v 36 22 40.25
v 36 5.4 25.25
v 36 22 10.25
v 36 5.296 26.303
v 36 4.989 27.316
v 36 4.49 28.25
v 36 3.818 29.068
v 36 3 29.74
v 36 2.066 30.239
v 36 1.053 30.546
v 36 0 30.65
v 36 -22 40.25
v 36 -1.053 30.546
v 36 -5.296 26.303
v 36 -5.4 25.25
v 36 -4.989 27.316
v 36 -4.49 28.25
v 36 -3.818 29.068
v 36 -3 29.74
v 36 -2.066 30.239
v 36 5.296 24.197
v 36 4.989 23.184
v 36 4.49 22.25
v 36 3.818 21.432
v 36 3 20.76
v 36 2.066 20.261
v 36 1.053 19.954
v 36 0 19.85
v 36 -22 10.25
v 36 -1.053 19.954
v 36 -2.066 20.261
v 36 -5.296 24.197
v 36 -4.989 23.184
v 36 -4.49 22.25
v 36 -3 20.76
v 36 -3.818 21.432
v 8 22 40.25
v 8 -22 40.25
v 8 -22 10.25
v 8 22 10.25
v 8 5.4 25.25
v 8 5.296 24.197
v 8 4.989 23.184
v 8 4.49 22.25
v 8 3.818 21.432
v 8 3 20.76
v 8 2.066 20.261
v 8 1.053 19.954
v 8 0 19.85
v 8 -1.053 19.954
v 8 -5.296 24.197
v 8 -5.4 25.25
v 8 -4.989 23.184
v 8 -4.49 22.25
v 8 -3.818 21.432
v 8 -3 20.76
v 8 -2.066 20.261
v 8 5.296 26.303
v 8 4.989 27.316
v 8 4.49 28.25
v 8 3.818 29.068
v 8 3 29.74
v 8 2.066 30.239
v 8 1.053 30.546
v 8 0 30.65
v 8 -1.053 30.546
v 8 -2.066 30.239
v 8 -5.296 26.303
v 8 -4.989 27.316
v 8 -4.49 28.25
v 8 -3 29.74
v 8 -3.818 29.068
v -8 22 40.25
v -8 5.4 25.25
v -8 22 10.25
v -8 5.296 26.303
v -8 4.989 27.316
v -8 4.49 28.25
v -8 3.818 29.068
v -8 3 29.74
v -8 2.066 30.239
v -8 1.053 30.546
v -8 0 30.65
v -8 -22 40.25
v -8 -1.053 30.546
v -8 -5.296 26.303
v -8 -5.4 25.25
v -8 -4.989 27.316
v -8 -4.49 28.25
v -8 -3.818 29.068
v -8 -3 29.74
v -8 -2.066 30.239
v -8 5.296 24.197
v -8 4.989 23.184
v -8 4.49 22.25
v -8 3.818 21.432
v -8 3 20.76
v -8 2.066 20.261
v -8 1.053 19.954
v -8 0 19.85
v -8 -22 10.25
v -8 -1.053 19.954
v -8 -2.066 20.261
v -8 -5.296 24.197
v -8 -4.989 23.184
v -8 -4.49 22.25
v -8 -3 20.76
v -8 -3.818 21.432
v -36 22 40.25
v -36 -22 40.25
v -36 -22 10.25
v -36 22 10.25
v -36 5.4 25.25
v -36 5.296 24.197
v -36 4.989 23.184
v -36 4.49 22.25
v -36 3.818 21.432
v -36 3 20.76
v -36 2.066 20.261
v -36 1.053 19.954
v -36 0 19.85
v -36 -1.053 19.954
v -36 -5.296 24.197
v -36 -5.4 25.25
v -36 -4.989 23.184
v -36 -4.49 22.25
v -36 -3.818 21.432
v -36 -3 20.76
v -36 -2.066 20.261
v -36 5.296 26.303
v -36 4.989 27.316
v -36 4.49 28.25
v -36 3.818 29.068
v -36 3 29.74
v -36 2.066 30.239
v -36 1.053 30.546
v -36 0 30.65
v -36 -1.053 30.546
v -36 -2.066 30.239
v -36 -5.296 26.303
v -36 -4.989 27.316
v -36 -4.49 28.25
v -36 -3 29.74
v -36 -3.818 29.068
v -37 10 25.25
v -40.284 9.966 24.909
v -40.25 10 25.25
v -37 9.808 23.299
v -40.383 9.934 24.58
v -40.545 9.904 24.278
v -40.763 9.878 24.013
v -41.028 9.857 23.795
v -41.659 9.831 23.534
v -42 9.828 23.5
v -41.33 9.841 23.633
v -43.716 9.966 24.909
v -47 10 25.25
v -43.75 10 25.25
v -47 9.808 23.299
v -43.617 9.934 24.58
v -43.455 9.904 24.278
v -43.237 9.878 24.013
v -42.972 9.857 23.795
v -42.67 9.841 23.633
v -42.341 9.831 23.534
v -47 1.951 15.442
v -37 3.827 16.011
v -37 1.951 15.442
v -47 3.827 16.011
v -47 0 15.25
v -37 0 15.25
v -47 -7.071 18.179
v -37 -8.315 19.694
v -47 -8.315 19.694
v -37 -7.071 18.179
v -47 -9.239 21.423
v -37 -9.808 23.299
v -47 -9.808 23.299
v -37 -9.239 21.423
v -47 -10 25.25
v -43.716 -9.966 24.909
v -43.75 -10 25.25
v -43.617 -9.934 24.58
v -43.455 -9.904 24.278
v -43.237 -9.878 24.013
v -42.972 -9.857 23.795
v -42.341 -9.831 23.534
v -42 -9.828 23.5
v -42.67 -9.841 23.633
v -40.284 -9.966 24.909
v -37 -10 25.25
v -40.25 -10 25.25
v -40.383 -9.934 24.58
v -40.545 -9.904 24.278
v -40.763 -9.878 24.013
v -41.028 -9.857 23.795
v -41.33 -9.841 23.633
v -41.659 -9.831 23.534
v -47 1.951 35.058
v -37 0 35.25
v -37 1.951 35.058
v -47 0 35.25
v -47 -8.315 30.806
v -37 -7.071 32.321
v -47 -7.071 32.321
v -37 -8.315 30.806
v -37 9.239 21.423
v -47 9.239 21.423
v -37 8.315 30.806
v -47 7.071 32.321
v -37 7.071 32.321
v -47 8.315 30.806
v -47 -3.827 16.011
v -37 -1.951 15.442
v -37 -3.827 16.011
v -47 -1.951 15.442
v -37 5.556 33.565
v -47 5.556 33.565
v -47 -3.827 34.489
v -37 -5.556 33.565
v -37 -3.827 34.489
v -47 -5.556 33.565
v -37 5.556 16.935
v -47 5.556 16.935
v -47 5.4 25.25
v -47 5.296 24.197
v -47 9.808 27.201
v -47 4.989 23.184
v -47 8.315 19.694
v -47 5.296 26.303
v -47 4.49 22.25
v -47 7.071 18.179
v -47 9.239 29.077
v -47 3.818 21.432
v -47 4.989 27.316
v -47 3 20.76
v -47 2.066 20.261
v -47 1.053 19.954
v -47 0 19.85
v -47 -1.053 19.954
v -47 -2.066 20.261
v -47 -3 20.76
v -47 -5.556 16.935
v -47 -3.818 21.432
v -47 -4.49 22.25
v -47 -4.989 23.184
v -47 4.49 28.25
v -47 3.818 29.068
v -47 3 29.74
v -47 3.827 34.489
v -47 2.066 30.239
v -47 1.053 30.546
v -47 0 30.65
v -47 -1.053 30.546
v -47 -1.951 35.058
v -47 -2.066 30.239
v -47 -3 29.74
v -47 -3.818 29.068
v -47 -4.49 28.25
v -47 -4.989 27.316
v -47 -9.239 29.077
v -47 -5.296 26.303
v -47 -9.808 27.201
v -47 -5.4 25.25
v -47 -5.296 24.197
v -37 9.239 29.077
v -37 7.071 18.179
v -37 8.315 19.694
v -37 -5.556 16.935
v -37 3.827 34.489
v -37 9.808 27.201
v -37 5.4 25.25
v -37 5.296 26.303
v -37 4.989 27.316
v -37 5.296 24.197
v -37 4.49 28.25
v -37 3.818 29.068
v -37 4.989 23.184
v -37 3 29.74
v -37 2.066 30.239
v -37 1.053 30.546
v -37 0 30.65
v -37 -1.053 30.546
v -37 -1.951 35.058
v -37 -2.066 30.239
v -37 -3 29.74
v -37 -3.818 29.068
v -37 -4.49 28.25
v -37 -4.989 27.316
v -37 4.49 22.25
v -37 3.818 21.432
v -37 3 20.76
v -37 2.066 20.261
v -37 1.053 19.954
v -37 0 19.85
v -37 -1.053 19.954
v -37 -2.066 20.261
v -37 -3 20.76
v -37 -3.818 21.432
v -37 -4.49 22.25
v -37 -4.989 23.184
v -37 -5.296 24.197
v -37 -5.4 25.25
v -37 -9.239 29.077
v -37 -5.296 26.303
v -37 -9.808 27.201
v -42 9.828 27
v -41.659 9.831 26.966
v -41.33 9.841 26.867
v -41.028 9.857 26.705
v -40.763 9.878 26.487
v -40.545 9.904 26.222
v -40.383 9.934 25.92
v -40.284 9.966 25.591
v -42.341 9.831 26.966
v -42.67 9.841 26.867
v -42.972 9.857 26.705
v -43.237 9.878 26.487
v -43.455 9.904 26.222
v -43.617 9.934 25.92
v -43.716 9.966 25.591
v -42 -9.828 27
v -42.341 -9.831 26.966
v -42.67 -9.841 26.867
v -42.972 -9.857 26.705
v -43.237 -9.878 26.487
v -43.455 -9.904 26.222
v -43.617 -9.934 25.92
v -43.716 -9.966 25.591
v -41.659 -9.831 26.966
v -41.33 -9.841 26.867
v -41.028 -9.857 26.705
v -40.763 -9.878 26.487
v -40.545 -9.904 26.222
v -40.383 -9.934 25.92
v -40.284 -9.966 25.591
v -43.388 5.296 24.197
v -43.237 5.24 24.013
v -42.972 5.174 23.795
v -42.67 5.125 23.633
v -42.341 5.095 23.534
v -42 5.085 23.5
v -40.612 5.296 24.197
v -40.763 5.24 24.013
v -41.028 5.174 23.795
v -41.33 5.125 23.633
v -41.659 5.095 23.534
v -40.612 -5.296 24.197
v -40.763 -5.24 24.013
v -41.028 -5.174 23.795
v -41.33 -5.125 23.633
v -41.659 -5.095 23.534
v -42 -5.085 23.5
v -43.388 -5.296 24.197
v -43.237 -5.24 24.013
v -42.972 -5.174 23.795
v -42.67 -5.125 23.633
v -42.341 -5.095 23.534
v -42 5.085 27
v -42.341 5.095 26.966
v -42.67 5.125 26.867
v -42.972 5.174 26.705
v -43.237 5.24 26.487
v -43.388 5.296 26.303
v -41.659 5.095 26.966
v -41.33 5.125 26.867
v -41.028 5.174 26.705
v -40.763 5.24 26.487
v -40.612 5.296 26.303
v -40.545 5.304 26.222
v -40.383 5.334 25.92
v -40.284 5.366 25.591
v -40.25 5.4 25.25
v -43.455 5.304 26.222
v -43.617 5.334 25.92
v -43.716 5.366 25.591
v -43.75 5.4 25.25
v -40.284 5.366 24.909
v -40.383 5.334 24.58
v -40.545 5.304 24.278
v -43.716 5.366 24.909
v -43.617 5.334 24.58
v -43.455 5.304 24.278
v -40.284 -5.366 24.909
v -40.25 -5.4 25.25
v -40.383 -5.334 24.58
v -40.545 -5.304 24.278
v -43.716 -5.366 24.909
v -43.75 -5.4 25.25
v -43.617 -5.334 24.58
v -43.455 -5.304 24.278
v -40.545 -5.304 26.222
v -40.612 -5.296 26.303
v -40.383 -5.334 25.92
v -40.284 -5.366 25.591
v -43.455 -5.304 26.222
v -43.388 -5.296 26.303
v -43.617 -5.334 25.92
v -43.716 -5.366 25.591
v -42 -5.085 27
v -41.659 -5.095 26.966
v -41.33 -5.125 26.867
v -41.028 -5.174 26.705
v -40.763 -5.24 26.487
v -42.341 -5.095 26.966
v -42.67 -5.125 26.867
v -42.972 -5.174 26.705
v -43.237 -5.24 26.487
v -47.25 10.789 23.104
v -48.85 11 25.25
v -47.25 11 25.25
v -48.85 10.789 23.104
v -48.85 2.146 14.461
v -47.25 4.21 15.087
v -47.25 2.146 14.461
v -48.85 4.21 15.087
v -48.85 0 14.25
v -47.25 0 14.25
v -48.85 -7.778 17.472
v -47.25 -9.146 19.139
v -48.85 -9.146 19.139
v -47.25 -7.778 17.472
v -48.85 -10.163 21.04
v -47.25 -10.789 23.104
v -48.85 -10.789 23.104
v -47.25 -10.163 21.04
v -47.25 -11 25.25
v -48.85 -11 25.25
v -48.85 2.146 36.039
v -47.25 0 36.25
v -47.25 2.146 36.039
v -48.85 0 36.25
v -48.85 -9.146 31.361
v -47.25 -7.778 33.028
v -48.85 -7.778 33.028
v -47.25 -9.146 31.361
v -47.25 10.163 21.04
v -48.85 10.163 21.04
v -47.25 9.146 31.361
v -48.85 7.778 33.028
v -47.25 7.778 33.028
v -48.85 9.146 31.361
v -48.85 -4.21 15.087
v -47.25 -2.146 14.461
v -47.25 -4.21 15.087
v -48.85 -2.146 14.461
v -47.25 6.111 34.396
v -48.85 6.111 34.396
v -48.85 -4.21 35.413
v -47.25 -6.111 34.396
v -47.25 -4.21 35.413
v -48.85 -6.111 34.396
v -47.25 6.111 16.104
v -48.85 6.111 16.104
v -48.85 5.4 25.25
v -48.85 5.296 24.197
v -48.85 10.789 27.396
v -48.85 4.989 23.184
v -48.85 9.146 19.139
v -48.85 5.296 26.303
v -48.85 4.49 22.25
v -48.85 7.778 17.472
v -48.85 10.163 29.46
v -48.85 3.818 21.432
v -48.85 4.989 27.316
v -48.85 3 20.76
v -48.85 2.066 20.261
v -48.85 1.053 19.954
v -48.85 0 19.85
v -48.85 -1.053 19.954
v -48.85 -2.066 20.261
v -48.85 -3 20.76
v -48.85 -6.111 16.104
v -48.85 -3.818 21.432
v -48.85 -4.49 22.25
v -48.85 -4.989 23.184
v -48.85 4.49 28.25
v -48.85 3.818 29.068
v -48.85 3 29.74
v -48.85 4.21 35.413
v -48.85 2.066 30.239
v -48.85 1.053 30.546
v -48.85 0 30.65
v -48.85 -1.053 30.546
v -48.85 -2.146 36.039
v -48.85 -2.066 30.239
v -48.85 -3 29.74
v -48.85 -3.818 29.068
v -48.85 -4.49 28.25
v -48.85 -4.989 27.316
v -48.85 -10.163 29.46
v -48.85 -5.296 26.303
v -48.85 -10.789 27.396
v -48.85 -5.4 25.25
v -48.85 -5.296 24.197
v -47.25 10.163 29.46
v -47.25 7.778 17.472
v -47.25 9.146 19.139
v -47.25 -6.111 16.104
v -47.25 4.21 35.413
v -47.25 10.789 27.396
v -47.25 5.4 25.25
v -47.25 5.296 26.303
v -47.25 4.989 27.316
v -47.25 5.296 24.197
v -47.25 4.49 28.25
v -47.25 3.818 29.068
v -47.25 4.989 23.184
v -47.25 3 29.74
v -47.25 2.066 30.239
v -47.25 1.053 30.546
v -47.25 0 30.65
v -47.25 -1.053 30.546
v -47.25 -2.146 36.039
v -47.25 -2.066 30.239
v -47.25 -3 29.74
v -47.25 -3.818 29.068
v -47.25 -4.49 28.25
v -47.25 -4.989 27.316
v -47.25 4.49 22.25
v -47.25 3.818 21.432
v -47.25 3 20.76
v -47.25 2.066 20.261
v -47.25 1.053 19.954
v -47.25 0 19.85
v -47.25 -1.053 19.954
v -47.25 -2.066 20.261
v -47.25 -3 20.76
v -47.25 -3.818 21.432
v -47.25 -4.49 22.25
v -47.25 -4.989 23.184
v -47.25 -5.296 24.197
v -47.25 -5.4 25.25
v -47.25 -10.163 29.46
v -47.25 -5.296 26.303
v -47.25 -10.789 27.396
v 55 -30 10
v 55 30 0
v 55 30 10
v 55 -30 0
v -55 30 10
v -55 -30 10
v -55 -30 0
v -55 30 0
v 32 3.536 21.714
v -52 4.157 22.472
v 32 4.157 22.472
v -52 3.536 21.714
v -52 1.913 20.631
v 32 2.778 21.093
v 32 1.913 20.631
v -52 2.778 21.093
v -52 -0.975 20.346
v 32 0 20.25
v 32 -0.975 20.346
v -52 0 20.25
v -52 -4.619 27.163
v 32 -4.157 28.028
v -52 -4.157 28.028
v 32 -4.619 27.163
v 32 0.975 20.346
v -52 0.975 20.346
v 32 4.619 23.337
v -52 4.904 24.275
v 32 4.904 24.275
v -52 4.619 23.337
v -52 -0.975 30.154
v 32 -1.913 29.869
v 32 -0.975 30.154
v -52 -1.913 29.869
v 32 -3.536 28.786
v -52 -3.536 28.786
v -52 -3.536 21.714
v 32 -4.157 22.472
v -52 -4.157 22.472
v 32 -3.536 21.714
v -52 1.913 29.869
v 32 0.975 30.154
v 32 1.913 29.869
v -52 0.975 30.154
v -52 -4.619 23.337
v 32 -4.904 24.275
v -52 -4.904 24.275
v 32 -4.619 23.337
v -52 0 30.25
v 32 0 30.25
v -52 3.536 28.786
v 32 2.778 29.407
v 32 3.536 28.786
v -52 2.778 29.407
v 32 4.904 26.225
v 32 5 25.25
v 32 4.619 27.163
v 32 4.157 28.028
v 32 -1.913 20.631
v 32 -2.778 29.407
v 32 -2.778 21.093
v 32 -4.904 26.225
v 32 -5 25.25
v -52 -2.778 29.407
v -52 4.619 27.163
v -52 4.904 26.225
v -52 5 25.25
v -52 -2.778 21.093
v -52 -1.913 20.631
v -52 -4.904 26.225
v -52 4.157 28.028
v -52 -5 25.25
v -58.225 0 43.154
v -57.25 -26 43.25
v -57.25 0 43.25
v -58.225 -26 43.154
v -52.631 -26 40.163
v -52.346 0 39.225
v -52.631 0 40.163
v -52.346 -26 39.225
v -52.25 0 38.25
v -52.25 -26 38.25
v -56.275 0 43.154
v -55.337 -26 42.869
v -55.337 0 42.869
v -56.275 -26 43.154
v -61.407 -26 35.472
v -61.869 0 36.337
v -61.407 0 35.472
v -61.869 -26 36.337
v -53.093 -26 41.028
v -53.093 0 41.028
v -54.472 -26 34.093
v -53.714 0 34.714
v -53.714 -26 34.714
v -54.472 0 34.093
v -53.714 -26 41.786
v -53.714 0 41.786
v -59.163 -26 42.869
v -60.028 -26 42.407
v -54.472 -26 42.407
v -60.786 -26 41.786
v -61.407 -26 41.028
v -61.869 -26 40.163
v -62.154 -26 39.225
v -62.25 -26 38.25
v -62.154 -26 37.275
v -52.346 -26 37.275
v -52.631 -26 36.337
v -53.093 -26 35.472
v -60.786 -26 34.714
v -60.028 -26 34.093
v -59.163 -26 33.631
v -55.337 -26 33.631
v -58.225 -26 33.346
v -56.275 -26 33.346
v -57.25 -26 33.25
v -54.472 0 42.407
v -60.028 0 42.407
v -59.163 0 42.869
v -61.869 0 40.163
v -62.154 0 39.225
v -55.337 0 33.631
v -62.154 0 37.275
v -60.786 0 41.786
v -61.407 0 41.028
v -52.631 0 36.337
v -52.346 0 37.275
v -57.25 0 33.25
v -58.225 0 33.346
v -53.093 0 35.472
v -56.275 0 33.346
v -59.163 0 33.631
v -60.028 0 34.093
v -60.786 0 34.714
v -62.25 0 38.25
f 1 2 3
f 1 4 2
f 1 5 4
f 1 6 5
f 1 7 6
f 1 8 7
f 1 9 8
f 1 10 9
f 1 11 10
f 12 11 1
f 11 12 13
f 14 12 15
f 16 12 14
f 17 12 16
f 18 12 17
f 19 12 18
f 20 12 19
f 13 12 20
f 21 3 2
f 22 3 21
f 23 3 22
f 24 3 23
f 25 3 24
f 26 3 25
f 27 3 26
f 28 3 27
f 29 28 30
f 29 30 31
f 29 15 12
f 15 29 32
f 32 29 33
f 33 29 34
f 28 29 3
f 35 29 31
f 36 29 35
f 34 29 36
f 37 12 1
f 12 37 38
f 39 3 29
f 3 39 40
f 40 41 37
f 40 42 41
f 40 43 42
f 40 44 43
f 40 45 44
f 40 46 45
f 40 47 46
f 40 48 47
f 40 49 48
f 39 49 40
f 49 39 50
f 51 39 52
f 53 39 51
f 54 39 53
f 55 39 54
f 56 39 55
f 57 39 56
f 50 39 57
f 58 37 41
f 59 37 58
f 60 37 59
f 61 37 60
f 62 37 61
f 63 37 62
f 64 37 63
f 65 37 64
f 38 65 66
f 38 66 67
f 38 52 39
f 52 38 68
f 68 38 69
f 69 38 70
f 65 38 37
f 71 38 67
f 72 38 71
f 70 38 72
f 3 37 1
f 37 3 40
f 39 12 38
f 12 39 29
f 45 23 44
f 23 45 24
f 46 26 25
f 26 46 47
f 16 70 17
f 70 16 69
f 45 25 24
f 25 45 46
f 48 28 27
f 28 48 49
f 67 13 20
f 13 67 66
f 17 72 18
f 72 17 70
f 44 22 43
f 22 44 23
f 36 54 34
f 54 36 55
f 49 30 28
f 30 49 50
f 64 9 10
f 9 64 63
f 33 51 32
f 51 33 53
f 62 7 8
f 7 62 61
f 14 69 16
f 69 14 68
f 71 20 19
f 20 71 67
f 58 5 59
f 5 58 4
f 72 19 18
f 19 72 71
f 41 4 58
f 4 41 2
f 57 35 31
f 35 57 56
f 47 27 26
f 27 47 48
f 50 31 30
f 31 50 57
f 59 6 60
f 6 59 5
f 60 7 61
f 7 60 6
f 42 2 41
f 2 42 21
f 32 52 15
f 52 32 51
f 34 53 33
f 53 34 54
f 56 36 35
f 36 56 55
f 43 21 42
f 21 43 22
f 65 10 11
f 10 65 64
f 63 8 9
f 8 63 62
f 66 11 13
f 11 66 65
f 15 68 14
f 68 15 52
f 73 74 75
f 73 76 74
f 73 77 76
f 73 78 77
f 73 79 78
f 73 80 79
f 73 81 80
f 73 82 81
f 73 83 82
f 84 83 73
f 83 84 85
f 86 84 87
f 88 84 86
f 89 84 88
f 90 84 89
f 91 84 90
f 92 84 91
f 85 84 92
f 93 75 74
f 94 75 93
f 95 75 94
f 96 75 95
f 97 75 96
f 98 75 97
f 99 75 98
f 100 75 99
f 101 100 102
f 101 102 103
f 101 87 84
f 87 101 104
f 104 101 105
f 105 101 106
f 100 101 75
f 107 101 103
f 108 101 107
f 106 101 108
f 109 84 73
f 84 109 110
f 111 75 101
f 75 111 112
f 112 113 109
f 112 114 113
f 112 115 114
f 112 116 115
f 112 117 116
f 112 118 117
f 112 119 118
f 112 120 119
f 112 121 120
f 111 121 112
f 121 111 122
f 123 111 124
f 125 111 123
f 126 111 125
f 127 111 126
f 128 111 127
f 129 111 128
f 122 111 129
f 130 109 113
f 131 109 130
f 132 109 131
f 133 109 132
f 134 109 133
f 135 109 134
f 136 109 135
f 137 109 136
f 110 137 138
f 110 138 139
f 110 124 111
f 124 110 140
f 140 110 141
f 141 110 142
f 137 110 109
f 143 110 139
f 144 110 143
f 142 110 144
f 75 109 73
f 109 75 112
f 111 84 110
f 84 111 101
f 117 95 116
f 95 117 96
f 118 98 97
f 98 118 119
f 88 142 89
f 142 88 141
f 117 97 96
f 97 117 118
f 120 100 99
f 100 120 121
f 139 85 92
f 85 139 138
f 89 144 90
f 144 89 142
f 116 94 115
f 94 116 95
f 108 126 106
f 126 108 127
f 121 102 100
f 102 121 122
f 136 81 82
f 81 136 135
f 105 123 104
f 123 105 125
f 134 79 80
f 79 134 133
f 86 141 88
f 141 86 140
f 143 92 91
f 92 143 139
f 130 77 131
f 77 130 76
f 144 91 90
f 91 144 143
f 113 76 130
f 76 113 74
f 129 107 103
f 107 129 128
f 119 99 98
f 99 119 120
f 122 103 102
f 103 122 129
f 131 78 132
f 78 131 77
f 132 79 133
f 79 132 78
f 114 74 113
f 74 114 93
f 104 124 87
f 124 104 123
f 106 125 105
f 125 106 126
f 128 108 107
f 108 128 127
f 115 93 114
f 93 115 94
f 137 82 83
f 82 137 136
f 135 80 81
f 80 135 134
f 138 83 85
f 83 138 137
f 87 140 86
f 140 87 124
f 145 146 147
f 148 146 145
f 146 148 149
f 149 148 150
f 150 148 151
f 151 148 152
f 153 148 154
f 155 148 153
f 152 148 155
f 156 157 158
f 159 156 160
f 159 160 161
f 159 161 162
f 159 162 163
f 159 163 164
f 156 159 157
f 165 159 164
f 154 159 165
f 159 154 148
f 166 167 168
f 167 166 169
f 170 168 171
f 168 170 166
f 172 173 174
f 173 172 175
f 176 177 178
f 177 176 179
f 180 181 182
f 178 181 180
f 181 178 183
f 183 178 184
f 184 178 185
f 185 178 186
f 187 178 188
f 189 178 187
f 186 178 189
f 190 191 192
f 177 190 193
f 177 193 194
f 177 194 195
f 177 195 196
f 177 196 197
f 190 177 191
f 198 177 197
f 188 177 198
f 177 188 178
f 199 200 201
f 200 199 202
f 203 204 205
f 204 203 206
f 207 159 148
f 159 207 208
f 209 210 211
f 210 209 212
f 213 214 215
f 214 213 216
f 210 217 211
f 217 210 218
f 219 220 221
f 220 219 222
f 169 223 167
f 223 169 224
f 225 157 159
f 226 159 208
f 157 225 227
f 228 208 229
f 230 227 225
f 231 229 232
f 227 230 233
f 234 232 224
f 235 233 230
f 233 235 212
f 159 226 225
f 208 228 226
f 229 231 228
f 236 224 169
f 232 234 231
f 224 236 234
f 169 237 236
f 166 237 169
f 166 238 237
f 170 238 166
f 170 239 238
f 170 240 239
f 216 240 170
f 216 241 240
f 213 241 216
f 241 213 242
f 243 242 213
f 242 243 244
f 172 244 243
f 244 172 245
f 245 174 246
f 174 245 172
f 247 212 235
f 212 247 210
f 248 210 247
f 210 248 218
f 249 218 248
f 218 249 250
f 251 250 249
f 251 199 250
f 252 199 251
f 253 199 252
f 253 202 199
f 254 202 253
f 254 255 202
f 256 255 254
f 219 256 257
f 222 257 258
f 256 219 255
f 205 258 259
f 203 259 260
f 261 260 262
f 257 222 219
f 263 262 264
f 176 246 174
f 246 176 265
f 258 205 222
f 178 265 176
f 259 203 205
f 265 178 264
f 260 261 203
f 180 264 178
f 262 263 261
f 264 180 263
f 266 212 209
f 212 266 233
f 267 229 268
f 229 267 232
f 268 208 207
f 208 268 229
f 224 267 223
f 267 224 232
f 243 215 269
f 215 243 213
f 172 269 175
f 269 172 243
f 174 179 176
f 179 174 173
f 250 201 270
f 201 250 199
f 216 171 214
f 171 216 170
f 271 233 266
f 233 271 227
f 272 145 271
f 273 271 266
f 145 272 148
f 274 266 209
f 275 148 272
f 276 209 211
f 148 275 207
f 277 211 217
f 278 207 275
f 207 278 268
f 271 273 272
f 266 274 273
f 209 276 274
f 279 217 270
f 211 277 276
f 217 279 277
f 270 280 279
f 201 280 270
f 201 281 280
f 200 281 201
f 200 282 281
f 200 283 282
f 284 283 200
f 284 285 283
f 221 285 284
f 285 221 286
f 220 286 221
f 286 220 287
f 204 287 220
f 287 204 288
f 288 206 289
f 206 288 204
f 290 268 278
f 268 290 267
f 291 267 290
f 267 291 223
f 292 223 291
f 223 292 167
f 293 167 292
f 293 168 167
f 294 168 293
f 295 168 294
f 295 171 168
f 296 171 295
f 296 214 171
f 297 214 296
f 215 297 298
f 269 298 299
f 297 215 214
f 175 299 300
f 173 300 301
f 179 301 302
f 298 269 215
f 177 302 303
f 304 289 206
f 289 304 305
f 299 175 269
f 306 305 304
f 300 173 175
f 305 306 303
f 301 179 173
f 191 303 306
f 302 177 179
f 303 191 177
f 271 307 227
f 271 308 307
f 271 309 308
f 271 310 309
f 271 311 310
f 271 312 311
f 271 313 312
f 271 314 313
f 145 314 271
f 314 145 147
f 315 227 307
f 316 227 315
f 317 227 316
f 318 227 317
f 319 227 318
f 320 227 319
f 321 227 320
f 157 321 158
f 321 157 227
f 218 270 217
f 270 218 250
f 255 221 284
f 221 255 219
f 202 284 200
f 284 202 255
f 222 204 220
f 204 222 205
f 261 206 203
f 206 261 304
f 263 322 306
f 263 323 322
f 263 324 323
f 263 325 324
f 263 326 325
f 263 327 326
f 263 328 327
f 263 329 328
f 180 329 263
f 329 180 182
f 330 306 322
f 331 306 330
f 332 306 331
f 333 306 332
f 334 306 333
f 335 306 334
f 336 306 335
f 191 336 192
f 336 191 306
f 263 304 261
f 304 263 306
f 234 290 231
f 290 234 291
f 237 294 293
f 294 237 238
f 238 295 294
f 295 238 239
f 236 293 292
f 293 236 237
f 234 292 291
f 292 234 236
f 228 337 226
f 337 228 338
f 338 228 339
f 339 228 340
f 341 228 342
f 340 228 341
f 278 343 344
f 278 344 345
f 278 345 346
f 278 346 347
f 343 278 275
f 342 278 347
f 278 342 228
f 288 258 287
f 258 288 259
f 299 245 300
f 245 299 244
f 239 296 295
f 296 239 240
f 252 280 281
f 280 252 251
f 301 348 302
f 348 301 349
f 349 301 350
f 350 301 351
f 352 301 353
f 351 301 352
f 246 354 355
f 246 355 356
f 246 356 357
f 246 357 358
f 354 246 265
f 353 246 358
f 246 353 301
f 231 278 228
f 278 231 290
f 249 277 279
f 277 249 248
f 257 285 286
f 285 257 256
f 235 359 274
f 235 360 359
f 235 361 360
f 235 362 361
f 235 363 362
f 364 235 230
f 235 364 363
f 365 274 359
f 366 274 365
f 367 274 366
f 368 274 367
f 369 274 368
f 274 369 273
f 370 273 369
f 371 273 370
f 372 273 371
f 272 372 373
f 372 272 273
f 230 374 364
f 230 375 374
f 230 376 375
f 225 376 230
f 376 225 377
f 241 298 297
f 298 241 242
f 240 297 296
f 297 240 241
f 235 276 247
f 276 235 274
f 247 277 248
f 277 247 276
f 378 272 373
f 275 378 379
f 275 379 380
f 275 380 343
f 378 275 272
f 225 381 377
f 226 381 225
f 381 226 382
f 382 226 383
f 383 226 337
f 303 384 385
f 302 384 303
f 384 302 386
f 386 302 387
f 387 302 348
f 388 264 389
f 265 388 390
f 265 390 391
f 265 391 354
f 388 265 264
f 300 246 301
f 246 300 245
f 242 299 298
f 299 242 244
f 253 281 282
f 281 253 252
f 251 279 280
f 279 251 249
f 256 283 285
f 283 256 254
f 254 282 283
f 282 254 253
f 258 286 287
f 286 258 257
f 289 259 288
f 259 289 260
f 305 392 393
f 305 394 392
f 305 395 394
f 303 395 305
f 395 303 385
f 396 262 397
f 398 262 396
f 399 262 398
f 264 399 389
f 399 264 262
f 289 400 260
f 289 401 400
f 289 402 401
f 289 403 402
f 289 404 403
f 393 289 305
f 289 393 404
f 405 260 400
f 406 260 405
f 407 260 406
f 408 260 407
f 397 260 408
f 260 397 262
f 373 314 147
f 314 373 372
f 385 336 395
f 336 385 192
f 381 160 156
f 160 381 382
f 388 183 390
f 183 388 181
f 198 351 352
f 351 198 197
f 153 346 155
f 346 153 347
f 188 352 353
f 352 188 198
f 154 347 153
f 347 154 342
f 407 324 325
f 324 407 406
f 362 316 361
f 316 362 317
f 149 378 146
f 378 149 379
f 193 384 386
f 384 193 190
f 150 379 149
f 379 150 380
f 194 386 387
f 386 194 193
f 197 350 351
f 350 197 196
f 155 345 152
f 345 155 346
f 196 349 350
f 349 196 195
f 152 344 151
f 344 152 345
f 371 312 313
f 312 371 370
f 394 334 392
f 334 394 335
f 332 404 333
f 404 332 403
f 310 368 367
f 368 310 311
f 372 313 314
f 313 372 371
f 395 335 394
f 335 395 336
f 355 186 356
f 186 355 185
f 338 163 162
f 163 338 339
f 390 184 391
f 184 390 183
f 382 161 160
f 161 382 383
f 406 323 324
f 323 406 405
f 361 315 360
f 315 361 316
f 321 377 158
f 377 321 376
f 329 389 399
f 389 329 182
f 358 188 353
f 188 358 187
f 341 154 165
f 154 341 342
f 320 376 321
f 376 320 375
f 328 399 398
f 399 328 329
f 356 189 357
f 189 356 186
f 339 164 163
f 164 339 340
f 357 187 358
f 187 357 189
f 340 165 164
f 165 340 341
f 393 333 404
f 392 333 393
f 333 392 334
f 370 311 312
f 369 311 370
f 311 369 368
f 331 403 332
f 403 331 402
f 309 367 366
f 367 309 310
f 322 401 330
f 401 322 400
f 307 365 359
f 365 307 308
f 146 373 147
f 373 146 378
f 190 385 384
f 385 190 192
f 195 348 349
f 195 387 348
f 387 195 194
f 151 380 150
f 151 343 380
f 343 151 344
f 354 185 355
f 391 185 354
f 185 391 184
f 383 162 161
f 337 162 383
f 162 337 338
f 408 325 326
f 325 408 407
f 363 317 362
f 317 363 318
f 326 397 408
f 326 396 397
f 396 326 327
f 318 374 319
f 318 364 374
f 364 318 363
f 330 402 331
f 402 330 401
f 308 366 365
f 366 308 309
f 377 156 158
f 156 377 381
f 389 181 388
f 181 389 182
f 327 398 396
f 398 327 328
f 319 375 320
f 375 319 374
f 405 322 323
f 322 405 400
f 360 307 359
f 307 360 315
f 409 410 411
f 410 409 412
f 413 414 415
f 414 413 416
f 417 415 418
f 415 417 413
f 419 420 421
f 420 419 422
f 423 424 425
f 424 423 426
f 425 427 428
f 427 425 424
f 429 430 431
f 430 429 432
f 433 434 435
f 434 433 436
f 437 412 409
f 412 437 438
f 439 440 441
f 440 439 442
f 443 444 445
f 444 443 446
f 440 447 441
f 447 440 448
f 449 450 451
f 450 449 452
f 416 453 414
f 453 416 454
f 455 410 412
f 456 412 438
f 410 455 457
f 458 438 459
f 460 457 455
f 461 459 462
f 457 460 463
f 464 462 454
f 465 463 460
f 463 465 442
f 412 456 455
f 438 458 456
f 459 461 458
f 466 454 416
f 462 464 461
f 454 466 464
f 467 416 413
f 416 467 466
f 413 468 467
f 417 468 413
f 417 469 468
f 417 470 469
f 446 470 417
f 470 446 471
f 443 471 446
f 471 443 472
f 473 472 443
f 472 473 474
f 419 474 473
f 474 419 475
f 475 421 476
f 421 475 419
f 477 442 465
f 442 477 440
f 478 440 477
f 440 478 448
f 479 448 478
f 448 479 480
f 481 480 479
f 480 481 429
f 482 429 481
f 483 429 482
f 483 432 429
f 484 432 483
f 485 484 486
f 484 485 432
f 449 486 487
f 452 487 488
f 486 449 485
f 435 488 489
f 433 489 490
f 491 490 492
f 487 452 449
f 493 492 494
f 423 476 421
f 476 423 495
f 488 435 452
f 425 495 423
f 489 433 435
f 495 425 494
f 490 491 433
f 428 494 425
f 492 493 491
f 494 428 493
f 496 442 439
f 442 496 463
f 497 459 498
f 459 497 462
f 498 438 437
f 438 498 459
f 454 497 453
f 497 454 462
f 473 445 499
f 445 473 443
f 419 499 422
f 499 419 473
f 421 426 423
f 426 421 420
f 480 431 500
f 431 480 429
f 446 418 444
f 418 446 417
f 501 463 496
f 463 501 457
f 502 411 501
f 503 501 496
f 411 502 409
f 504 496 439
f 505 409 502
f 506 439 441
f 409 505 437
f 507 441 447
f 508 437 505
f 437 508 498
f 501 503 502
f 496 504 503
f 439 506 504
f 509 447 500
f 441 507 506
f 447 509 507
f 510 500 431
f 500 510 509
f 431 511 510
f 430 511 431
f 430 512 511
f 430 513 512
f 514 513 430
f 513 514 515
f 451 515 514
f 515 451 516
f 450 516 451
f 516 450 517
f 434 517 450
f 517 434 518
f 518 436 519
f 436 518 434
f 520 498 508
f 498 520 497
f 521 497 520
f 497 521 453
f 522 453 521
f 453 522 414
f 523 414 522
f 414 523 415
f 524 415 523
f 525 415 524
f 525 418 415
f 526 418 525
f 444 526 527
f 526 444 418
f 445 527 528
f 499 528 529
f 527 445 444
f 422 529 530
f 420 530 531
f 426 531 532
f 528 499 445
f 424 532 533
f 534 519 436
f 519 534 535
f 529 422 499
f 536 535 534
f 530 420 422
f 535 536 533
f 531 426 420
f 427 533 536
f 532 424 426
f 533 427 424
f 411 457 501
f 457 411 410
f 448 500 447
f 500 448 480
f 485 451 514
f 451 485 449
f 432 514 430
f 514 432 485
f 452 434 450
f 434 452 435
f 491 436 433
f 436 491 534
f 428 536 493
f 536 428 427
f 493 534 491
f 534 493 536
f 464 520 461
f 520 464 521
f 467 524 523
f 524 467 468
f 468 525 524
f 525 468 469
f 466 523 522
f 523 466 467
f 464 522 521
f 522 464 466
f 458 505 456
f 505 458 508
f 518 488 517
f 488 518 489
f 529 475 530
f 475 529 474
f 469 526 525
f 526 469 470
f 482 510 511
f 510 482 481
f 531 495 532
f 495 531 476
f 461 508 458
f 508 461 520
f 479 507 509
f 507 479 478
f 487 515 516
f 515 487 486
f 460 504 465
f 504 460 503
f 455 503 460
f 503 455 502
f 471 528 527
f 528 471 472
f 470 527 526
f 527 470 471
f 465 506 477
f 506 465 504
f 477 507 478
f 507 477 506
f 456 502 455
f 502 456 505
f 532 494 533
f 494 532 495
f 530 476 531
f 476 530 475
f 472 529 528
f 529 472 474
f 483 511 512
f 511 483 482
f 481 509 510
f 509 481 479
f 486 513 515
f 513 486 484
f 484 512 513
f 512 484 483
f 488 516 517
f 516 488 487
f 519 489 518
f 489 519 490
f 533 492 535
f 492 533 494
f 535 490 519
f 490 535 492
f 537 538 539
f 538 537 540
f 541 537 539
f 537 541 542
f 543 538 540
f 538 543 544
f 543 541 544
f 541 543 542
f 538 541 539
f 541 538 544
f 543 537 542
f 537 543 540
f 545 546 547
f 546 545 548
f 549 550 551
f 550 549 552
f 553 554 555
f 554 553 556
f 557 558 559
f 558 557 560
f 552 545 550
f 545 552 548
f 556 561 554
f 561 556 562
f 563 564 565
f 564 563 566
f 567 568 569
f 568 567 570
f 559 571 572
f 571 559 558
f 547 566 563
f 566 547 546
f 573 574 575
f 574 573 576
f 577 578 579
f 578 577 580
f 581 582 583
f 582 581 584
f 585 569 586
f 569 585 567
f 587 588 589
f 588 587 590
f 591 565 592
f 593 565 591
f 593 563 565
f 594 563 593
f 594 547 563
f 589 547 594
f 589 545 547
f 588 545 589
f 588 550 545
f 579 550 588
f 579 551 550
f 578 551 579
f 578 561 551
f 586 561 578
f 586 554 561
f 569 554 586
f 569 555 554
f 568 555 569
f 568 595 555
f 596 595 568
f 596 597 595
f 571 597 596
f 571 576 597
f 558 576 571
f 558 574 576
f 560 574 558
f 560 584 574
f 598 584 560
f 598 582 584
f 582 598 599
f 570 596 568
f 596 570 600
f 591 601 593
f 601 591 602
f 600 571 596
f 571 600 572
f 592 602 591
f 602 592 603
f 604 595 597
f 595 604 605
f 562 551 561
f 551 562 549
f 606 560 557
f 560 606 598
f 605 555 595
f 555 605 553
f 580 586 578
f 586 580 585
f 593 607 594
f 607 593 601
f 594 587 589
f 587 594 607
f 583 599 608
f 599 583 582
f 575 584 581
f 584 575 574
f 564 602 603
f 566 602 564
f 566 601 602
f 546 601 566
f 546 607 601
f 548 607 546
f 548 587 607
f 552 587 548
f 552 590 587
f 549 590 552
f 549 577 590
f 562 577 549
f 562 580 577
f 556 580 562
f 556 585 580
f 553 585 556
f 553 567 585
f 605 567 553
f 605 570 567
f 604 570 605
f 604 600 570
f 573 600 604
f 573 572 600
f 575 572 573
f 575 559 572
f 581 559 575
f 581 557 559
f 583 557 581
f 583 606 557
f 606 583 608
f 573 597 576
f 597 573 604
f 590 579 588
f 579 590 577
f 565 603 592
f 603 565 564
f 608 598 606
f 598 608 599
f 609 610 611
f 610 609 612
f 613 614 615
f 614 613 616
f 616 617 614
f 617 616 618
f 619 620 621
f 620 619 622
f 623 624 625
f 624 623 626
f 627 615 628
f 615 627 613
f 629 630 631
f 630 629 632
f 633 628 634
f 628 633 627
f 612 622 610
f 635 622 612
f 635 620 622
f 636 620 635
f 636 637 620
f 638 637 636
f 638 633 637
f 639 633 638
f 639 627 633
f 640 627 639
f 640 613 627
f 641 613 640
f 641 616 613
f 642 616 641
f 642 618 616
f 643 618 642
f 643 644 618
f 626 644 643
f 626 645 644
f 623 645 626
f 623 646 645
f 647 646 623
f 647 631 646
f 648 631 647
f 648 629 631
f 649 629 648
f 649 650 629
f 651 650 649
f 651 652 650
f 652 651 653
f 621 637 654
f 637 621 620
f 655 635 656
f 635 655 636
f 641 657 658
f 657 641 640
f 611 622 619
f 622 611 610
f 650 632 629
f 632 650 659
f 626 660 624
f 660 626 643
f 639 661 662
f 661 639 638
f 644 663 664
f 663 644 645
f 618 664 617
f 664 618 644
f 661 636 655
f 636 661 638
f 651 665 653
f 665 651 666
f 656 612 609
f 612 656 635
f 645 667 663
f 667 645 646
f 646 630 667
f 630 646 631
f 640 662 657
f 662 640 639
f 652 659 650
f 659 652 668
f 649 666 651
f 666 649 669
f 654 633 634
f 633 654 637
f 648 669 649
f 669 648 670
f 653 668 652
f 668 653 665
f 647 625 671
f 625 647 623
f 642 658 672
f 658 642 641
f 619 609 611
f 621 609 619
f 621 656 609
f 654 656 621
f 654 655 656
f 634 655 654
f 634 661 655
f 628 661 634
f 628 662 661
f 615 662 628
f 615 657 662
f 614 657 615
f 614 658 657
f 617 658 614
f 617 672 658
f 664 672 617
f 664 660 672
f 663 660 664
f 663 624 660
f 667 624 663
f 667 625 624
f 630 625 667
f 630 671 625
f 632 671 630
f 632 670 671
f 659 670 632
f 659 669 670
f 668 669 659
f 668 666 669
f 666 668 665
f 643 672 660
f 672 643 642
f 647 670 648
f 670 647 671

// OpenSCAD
$fn = 32;

// ------------------------------------------------------------------------
// Machine vise: screw d10, jaws 28 x 30 mm
// Every part is its own module, assembly() places every instance.
// ------------------------------------------------------------------------

// --- part 1 ---
module vise_bed() {
  difference() {
    translate([-55, -30, 0]) cube([110, 60, 10]);
  }
}

// --- part 2 ---
module vise_jaw() {
  difference() {
    translate([-14, -22, 0]) cube([28, 44, 30]);
    translate([0, 0, 15]) rotate([0, 90, 0]) cylinder(h = 30, d = 10.8, center = true);
  }
}

// --- part 3 ---
module vise_screw() {
  translate([0, 0, -42]) cylinder(h = 84, d = 10);
}

// --- part 4 ---
module screw_collar() {
  difference() {
    cylinder(h = 10, d = 20);
    translate([0, 0, -1]) cylinder(h = 12, d = 10.8);
    translate([0, 0, 5]) rotate([90, 0, 0]) cylinder(h = 22, d = 3.5, center = true);
  }
}

// --- part 5 ---
module screw_washer() {
  difference() {
      translate([0, 0, 0]) cylinder(h = 1.6, d = 22);
      translate([0, 0, -1]) cylinder(h = 3.6, d = 10.8);
    }
}

// --- part 6 ---
module vise_handle() {
  cylinder(h = 26, d = 10);
}

// --- assembly ---
module assembly() {
  color([0.80, 0.24, 0.20]) translate([0, 0, 0]) rotate([0, 0, 0]) vise_bed();
  color([0.20, 0.45, 0.75]) translate([22, 0, 10.25]) rotate([0, 0, 0]) vise_jaw();
  color([0.25, 0.62, 0.32]) translate([-22, 0, 10.25]) rotate([0, 0, 0]) vise_jaw();
  color([0.92, 0.70, 0.18]) translate([-10, 0, 25.25]) rotate([0, 90, 0]) vise_screw();
  color([0.58, 0.35, 0.70]) translate([-47, 0, 25.25]) rotate([0, 90, 0]) screw_collar();
  color([0.16, 0.66, 0.66]) translate([-48.85, 0, 25.25]) rotate([0, 90, 0]) screw_washer();
  color([0.85, 0.48, 0.18]) translate([-57.25, 0, 38.25]) rotate([90, 0, 0]) vise_handle();
}

assembly();
